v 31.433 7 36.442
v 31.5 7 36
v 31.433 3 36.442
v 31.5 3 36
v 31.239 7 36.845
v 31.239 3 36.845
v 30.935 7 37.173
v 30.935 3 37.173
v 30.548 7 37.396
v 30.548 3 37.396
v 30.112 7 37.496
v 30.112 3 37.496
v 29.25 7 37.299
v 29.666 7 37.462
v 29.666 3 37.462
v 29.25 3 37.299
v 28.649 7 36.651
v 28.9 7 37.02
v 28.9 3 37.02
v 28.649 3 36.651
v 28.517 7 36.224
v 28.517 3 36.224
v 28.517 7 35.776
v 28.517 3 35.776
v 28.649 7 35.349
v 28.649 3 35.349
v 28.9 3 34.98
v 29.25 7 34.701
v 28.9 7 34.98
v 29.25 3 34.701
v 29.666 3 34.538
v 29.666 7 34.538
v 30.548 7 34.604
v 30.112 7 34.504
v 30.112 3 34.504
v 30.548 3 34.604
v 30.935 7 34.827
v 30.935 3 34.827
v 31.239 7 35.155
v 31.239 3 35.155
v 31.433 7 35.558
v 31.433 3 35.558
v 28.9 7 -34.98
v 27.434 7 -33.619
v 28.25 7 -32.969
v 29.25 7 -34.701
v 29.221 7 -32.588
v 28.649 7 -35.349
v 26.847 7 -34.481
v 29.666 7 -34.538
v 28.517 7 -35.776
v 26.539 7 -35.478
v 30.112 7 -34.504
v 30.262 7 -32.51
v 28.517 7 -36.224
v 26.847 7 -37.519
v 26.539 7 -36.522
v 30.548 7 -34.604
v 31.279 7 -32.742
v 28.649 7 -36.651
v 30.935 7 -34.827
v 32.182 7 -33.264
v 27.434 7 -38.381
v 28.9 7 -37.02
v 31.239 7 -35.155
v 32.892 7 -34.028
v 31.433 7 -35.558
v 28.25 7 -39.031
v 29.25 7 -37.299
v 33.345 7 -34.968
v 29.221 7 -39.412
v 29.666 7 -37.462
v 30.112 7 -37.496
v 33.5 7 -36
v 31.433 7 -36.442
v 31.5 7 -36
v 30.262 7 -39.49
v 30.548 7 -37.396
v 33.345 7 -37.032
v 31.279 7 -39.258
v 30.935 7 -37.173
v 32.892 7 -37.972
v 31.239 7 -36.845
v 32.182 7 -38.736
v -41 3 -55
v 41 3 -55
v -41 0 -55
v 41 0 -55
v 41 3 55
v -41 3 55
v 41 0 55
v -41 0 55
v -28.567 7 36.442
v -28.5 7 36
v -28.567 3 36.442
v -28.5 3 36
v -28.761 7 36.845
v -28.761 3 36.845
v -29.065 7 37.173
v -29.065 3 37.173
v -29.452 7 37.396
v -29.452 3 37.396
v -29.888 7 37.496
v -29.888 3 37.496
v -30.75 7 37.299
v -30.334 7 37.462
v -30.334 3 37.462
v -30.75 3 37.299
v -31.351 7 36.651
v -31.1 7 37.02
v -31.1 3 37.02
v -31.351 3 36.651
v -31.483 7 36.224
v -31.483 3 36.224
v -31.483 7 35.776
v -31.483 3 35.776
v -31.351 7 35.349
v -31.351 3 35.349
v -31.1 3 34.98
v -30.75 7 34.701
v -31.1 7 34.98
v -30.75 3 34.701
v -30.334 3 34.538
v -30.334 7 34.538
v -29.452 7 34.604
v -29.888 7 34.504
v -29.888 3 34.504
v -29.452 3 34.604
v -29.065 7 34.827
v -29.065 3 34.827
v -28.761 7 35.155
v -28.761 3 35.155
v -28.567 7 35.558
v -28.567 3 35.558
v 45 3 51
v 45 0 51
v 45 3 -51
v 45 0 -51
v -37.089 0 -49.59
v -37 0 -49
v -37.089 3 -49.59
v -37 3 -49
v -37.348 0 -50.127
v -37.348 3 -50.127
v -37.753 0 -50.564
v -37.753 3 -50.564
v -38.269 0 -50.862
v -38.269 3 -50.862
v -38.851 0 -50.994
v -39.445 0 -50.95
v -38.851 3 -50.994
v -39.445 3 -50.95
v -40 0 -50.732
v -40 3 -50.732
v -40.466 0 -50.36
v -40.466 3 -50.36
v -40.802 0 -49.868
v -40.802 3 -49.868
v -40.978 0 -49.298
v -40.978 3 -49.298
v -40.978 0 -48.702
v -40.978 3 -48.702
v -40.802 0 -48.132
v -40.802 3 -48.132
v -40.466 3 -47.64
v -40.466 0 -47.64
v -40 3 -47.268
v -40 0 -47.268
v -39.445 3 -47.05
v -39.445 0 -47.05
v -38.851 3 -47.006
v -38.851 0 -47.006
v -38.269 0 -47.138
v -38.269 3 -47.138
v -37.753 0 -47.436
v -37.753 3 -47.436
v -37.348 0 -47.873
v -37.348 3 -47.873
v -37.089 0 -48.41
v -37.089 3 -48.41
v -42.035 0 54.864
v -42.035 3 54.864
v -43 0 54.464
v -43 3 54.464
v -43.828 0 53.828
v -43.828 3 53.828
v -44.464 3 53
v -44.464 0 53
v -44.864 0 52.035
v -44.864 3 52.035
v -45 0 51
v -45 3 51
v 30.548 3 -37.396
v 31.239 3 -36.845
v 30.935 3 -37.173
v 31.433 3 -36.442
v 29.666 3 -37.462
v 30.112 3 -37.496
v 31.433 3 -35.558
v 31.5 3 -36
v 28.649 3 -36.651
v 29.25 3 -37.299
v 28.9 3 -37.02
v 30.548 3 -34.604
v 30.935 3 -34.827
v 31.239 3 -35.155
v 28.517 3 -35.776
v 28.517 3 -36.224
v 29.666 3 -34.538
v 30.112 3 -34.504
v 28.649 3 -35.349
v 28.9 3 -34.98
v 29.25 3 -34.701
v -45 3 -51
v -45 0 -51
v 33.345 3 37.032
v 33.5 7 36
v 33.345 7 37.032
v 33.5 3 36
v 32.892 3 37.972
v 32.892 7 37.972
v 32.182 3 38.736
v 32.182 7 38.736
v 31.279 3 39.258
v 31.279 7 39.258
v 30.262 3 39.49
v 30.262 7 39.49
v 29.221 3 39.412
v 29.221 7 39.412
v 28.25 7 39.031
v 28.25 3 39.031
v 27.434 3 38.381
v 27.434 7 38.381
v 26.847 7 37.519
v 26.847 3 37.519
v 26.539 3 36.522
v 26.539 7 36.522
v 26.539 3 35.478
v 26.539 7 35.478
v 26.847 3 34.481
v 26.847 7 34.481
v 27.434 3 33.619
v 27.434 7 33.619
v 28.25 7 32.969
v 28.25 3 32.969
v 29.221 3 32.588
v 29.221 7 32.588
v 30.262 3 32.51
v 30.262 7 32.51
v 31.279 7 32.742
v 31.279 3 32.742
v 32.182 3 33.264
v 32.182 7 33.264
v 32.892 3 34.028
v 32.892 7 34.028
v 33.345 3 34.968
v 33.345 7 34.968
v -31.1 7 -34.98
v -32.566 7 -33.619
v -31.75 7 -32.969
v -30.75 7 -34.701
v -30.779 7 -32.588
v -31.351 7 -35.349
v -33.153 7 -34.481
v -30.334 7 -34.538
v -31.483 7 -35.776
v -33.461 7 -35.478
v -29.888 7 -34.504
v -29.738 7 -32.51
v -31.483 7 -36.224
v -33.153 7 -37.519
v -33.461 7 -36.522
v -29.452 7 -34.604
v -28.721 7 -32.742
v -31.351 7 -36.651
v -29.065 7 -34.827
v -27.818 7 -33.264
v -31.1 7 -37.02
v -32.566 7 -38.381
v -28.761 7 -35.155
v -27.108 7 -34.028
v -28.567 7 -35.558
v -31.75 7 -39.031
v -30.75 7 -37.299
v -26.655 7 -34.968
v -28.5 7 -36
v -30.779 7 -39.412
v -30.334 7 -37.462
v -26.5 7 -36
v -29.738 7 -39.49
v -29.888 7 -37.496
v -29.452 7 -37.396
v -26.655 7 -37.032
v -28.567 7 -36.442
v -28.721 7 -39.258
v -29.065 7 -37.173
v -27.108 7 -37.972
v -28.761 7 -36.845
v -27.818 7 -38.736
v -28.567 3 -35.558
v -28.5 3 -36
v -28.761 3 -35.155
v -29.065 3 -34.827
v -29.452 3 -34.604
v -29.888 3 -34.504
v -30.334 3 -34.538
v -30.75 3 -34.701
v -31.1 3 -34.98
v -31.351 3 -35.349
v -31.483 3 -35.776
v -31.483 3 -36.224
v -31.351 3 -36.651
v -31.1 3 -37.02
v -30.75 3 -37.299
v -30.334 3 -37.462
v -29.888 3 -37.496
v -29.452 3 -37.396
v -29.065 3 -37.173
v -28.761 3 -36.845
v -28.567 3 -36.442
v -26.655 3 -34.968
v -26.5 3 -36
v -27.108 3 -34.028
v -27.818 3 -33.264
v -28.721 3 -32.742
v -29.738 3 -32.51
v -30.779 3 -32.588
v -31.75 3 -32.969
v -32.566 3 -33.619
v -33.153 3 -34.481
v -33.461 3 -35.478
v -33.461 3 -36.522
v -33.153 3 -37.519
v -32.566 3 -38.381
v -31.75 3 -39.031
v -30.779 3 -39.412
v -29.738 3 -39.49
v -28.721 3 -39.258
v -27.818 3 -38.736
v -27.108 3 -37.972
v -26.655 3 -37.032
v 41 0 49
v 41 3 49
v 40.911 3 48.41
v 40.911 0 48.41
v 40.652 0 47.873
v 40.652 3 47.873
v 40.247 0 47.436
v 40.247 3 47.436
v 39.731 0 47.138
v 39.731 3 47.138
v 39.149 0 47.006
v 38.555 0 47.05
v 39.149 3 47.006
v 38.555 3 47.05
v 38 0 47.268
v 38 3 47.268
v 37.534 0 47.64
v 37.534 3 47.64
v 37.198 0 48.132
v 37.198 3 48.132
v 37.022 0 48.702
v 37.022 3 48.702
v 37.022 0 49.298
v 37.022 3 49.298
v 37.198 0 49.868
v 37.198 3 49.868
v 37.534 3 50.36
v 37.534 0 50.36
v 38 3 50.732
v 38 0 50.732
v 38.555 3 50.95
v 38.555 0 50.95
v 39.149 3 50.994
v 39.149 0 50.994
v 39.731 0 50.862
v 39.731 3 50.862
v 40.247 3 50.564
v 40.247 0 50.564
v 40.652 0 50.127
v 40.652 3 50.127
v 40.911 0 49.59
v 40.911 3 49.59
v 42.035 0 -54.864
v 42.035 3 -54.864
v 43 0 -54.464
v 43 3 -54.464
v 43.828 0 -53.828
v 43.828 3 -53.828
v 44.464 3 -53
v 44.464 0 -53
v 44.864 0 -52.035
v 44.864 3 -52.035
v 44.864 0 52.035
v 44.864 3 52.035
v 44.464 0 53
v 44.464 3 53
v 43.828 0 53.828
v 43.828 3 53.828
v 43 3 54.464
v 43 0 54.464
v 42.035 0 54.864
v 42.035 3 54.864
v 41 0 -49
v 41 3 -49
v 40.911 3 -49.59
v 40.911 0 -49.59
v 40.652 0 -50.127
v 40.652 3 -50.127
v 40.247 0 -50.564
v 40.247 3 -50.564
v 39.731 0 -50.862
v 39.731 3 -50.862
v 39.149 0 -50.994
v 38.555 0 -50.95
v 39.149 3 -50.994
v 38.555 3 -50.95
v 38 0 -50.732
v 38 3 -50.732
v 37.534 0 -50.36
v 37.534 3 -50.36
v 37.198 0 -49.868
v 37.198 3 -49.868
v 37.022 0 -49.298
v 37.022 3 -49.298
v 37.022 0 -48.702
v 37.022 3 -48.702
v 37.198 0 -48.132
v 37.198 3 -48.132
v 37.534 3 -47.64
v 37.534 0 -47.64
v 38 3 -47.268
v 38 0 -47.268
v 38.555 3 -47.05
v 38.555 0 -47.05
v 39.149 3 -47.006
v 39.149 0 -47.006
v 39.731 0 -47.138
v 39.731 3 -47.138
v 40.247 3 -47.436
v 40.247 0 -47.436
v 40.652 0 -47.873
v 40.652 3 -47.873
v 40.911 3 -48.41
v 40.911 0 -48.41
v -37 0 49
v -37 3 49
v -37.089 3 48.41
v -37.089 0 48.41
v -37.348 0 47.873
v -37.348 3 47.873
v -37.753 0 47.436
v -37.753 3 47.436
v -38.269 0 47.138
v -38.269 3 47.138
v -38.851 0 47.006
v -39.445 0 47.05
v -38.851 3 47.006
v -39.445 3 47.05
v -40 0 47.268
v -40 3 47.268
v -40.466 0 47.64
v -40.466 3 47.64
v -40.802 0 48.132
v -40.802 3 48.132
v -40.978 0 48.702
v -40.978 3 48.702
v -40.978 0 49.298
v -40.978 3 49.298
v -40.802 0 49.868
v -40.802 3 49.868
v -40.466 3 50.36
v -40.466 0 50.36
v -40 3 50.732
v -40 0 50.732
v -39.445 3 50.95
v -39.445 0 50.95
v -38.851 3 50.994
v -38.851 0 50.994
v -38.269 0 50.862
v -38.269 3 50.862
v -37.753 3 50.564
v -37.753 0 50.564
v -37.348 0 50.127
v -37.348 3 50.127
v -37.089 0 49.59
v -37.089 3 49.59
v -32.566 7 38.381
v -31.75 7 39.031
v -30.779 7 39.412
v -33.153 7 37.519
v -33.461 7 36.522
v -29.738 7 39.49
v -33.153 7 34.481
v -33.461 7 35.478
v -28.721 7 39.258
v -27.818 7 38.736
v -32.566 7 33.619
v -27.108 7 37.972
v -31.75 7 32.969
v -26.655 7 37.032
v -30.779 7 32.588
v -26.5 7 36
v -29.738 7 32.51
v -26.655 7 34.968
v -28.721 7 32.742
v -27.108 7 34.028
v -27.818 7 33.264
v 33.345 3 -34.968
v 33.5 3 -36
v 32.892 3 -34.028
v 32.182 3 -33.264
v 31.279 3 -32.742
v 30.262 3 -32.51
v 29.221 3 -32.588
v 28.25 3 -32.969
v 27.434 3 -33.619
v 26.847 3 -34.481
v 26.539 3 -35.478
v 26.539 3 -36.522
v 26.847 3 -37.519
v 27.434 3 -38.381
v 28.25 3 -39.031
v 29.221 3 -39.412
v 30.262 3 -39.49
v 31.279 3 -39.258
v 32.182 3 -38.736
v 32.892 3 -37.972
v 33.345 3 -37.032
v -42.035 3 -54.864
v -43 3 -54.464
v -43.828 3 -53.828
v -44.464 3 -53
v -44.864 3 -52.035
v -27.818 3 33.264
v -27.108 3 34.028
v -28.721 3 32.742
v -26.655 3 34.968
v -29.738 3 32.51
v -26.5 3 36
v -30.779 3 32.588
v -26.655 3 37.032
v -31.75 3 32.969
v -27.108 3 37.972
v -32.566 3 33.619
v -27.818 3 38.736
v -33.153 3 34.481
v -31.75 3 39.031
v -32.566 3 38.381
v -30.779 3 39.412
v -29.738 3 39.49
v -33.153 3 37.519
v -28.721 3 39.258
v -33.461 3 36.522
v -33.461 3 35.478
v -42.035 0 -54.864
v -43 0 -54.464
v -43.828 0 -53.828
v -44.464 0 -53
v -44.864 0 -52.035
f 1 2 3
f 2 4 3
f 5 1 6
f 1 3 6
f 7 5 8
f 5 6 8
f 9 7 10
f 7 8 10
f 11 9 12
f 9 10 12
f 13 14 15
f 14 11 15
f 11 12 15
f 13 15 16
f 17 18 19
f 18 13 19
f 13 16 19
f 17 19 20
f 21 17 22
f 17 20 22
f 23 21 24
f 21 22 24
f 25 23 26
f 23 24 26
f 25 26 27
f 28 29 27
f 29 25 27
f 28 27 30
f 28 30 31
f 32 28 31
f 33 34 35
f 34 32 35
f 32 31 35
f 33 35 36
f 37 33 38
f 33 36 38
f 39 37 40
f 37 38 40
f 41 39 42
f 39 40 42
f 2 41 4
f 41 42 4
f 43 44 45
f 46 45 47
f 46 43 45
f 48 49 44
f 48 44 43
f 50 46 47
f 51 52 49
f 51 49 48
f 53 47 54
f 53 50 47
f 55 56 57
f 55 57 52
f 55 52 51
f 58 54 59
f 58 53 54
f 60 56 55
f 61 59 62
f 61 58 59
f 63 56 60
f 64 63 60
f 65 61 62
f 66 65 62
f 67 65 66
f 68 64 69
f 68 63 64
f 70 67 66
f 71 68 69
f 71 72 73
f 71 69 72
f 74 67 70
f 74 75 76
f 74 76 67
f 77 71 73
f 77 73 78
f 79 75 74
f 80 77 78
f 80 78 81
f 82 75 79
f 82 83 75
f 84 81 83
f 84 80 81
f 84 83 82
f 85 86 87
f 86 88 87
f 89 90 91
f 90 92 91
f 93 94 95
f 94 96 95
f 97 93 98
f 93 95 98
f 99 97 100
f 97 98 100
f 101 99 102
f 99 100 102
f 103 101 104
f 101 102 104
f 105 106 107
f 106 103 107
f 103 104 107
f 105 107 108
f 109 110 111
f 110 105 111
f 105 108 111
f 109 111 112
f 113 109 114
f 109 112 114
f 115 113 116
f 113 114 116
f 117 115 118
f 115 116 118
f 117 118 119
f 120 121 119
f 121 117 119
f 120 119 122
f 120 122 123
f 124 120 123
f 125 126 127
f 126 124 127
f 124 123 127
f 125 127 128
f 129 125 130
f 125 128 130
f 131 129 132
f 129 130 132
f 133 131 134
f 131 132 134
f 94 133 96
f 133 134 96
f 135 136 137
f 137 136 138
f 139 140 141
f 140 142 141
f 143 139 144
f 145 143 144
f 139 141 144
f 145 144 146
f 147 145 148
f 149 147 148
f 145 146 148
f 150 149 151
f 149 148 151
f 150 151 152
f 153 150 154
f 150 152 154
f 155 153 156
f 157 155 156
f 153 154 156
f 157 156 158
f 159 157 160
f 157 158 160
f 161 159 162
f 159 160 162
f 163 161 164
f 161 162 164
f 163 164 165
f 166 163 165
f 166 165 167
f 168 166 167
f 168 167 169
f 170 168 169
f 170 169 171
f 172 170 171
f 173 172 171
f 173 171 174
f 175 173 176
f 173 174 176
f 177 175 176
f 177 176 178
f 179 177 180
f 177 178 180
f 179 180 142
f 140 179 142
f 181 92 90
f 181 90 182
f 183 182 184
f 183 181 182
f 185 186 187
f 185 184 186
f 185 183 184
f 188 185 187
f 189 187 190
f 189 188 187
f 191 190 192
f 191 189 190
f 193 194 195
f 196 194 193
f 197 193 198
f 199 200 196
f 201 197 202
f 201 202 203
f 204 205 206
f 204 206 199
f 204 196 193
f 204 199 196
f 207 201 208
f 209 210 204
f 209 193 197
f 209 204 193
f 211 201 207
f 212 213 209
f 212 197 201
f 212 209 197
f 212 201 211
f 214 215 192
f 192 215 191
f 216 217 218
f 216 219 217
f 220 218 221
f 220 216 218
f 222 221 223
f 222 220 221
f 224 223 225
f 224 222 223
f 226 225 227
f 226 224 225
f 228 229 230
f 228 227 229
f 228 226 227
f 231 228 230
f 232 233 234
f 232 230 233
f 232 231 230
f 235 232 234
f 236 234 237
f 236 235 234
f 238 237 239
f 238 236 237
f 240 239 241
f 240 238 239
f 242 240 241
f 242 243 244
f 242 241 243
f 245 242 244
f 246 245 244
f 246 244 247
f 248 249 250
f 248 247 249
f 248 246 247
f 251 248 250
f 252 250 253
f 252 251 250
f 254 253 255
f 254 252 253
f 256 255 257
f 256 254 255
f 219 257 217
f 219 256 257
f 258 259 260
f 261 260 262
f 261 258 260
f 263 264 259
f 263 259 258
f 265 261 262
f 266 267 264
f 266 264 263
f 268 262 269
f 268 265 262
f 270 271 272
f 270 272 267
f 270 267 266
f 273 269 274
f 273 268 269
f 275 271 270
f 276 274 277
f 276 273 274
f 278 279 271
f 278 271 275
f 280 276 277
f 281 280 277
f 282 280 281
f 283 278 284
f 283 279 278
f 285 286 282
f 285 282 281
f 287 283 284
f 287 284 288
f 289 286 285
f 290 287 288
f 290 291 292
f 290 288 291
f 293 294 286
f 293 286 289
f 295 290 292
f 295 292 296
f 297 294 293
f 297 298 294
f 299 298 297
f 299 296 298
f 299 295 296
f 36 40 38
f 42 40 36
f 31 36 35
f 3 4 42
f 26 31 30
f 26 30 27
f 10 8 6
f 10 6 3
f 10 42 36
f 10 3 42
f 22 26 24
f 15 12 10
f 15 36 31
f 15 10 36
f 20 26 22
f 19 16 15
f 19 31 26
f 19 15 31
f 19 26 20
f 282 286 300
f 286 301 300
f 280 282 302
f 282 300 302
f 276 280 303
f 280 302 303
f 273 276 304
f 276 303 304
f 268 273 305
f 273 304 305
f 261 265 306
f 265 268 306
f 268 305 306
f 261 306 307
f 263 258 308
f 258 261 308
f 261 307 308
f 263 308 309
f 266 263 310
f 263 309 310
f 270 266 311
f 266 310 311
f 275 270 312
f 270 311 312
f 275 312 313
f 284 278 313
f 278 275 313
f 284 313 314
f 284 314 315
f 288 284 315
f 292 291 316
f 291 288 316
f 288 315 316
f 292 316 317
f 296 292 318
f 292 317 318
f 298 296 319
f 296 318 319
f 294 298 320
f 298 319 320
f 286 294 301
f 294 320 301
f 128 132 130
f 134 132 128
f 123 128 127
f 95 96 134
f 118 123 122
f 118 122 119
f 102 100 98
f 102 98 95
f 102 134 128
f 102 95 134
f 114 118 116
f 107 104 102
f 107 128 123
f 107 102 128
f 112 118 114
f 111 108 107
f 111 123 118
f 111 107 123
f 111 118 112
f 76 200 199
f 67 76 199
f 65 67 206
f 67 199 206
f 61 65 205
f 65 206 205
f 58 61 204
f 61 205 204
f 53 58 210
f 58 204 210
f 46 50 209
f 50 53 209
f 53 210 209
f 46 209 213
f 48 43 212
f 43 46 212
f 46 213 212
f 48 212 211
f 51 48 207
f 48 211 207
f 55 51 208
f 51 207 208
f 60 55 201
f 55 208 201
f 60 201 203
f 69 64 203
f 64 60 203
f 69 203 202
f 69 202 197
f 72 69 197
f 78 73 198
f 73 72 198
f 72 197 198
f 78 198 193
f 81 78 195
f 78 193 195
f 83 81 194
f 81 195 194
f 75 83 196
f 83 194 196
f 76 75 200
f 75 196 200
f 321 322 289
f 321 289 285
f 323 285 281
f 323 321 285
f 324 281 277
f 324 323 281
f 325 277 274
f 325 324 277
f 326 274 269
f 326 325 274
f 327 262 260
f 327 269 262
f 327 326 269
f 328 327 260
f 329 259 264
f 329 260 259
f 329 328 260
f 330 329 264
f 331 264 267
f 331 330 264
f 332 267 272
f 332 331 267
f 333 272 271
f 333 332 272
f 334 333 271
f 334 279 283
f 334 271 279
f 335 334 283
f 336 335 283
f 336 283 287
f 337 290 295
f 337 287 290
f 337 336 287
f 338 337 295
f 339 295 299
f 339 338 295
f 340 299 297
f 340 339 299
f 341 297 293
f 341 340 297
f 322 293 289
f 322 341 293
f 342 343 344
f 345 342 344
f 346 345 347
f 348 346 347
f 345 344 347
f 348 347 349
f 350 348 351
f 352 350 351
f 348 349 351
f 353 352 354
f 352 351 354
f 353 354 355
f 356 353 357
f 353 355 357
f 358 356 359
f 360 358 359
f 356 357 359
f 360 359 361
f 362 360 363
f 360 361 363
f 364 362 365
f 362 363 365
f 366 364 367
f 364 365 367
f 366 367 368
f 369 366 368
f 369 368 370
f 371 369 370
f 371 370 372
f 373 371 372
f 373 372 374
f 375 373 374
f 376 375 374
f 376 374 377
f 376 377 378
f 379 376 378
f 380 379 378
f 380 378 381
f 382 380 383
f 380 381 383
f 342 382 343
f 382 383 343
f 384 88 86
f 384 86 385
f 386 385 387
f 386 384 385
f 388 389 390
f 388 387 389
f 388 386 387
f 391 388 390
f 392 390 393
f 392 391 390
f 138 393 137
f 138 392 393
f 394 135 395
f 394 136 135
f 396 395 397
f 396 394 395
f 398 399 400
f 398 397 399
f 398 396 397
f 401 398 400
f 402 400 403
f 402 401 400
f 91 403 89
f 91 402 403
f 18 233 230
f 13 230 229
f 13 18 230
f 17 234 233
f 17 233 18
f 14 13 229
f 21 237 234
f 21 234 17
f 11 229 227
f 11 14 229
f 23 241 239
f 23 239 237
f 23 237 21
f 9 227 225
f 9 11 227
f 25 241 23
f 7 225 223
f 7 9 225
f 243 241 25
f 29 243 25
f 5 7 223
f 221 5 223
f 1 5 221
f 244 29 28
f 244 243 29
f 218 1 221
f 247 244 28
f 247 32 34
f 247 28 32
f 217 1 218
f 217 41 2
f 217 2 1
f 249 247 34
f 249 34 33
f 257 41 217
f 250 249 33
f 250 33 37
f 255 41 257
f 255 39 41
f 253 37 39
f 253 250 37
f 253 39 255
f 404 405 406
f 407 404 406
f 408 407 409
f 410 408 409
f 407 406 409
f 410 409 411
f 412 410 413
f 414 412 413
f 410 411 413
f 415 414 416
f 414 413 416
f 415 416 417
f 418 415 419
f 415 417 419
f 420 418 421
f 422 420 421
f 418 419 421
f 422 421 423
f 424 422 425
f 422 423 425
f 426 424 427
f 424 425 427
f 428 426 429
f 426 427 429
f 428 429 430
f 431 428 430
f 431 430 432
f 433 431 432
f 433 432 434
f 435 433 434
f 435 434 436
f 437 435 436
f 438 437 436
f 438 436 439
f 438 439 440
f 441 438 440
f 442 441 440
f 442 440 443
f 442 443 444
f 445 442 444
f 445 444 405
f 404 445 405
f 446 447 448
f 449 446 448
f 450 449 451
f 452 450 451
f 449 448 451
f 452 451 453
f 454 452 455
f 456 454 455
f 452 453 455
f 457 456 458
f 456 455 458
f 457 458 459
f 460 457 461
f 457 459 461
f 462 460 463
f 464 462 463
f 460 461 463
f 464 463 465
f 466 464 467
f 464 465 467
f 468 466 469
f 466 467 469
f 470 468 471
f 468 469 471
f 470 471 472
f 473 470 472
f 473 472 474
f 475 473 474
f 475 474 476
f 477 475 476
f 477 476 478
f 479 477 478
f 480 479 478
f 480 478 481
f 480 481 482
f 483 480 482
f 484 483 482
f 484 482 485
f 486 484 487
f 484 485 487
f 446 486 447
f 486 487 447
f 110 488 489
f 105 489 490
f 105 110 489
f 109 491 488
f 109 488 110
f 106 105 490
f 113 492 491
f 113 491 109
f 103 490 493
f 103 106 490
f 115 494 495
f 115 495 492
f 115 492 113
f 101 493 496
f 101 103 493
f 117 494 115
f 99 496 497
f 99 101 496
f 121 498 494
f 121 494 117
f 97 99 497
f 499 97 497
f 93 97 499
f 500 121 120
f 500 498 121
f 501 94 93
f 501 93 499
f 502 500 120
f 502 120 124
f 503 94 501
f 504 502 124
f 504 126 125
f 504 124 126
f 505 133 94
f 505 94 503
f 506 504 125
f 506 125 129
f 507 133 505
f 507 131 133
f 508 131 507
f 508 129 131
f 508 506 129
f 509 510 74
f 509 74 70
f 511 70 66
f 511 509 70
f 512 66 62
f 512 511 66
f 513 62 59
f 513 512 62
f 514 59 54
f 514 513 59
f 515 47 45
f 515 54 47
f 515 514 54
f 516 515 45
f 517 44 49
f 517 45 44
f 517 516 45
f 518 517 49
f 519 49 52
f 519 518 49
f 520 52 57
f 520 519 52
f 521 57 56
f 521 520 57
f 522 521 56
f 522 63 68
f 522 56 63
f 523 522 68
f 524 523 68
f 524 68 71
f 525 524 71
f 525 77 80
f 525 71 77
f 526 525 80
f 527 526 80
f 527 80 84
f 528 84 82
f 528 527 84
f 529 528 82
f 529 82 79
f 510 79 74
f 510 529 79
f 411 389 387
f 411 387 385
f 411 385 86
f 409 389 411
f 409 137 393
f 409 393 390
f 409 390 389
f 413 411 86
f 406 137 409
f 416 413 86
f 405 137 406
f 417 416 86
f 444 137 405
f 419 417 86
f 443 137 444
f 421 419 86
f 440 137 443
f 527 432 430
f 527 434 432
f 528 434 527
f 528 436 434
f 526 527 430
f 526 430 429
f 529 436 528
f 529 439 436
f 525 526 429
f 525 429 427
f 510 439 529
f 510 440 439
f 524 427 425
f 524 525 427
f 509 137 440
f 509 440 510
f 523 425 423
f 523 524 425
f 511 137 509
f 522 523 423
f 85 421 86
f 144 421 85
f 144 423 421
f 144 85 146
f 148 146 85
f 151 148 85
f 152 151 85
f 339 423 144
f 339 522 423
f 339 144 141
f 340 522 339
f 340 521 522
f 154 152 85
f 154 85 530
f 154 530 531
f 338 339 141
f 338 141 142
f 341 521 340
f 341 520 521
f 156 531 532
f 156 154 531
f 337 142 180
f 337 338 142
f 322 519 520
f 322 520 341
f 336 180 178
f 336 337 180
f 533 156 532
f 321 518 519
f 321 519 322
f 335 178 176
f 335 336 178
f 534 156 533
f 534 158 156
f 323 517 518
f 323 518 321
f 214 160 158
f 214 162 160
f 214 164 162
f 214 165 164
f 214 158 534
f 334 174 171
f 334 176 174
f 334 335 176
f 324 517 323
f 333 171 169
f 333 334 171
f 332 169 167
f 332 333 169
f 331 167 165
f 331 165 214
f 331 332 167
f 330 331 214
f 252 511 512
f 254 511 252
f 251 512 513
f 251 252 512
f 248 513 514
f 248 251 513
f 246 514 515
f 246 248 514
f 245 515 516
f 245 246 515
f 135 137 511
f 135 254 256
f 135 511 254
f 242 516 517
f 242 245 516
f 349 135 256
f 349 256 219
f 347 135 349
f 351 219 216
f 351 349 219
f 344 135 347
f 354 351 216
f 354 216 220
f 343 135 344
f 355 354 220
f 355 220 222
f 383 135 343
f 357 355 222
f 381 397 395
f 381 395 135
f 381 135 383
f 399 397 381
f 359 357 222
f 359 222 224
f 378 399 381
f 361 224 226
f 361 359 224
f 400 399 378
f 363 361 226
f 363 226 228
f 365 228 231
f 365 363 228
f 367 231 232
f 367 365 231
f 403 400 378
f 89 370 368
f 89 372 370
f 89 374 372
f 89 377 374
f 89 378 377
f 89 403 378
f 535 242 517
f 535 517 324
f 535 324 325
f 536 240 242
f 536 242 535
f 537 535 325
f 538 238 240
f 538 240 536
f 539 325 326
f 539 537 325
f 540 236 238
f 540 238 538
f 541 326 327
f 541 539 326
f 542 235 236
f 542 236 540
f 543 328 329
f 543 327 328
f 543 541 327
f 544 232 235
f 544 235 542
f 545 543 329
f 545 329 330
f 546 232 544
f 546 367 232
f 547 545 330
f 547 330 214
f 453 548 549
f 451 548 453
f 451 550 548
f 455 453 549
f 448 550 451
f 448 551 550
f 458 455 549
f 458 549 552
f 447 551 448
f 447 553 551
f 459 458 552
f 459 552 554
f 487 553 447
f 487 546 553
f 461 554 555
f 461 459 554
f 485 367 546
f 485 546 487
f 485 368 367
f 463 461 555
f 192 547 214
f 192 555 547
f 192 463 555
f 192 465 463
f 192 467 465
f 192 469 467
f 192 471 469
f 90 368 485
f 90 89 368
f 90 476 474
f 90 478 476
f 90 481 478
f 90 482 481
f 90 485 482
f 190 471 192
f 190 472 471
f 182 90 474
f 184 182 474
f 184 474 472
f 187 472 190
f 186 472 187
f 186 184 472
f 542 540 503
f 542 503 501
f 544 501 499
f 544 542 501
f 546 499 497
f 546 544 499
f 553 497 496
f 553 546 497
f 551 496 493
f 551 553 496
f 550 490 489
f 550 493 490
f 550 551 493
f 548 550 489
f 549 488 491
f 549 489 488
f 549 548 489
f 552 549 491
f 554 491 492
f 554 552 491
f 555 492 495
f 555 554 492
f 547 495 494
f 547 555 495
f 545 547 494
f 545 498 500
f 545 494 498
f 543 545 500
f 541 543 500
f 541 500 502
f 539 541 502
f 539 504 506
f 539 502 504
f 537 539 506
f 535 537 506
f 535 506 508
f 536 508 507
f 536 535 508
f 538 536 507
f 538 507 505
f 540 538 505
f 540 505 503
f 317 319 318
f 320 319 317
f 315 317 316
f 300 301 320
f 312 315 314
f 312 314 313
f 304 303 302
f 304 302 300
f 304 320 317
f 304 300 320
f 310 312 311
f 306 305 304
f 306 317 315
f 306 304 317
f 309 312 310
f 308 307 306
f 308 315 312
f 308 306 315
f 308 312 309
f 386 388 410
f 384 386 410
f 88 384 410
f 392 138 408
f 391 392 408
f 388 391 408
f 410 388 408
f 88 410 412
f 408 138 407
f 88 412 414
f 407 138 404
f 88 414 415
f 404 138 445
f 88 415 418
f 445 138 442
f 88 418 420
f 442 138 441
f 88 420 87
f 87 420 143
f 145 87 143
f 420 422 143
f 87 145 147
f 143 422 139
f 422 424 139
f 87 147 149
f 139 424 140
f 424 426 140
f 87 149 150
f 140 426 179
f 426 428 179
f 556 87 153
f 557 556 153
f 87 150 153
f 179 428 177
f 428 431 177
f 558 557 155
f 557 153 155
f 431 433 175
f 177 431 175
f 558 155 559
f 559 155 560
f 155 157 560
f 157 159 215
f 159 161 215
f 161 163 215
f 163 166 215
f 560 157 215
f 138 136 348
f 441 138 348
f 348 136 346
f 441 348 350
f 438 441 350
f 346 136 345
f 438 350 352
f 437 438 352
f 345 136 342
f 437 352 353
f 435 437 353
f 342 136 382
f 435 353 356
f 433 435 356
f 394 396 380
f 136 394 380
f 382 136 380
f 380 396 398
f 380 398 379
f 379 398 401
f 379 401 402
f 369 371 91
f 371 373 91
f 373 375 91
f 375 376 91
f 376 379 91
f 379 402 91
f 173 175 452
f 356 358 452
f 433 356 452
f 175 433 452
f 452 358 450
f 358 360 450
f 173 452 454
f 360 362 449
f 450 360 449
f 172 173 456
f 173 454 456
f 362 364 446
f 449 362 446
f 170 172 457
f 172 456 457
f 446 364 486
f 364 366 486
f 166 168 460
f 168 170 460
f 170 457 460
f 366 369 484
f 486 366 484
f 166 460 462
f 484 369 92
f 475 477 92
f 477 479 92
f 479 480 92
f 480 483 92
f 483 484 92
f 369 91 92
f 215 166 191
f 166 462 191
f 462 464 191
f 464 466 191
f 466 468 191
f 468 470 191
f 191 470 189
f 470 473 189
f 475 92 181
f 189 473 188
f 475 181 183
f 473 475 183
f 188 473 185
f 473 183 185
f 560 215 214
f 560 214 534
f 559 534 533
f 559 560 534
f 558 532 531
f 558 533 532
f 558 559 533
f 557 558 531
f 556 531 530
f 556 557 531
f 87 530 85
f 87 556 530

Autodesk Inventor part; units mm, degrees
ref_plane "YZ Plane" through (0, 0, 0) normal (1, 0, 0) x (0, 1, 0)
ref_plane "XZ Plane" through (0, 0, 0) normal (0, 1, 0) x (-1, 0, 0)
ref_plane "XY Plane" through (0, 0, 0) normal (0, 0, 1) x (1, 0, 0)
sketch "Szkic1" plane through (0, 0, 0) normal (0, 1, 0) x (-1, 0, 0)
  line L0 (-41, -55) -> (41, -55)
  line L1 (45, -51) -> (45, 51)
  line L2 (41, 55) -> (-41, 55)
  line L3 (-45, 51) -> (-45, -51)
  arc A0 (-41, 55) -> (-45, 51) centre (-41, 51) ccw
  arc A1 (45, 51) -> (41, 55) centre (41, 51) ccw
  arc A2 (41, -55) -> (45, -51) centre (41, -51) ccw
  arc A3 (-45, -51) -> (-41, -55) centre (-41, -51) ccw
  dimension "d14" = 4
  dimension "d15" = 4
  dimension "d16" = 4
  dimension "d17" = 4
extrude "Wyciągnięcie proste1" add sketch "Szkic1" along normal blind 3
sketch "Szkic2" plane through (0, 3, 0) normal (0, 1, 0) x (1, 0, 0)
  circle A0 centre (-30, -36) radius 1.5
  circle A1 centre (-30, -36) radius 3.5
  circle A2 centre (-30, 36) radius 1.5
  circle A3 centre (-30, 36) radius 3.5
  circle A4 centre (30, -36) radius 1.5
  circle A5 centre (30, -36) radius 3.5
  circle A6 centre (30, 36) radius 1.5
  circle A7 centre (30, 36) radius 3.5
  point P0 (0, 0)
  dimension "d24" = 3
  dimension "d25" = 7
extrude "Wyciągnięcie proste2" add sketch "Szkic2" along normal blind 4
sketch "Szkic3" plane through (0, 3, 0) normal (0, 1, 0) x (1, 0, 0)
  circle A0 centre (39, -49) radius 2
  circle A1 centre (-39, -49) radius 2
  circle A2 centre (39, 49) radius 2
  circle A3 centre (-39, 49) radius 2
  point P0 (0, 0)
  dimension "d30" = 4
extrude "Wyciągnięcie proste3" cut sketch "Szkic3" against normal through all
thread "Gwint1" size "M4x0.7" class "6H" standard "ISO Metric profile" full length
thread "Gwint2" size "M4x0.7" class "6H" standard "ISO Metric profile" full length
thread "Gwint3" size "M4x0.7" class "6H" standard "ISO Metric profile" full length
thread "Gwint4" size "M4x0.7" class "6H" standard "ISO Metric profile" full length
thread "Gwint5" size "M3x0.5" class "6H" standard "ISO Metric profile" full length
thread "Gwint6" size "M3x0.5" class "6H" standard "ANSI Metric M Profile" full length
thread "Gwint7" size "M3x0.5" class "6H" standard "ANSI Metric M Profile" full length
thread "Gwint8" size "M3x0.5" class "6H" standard "ANSI Metric M Profile" full length
